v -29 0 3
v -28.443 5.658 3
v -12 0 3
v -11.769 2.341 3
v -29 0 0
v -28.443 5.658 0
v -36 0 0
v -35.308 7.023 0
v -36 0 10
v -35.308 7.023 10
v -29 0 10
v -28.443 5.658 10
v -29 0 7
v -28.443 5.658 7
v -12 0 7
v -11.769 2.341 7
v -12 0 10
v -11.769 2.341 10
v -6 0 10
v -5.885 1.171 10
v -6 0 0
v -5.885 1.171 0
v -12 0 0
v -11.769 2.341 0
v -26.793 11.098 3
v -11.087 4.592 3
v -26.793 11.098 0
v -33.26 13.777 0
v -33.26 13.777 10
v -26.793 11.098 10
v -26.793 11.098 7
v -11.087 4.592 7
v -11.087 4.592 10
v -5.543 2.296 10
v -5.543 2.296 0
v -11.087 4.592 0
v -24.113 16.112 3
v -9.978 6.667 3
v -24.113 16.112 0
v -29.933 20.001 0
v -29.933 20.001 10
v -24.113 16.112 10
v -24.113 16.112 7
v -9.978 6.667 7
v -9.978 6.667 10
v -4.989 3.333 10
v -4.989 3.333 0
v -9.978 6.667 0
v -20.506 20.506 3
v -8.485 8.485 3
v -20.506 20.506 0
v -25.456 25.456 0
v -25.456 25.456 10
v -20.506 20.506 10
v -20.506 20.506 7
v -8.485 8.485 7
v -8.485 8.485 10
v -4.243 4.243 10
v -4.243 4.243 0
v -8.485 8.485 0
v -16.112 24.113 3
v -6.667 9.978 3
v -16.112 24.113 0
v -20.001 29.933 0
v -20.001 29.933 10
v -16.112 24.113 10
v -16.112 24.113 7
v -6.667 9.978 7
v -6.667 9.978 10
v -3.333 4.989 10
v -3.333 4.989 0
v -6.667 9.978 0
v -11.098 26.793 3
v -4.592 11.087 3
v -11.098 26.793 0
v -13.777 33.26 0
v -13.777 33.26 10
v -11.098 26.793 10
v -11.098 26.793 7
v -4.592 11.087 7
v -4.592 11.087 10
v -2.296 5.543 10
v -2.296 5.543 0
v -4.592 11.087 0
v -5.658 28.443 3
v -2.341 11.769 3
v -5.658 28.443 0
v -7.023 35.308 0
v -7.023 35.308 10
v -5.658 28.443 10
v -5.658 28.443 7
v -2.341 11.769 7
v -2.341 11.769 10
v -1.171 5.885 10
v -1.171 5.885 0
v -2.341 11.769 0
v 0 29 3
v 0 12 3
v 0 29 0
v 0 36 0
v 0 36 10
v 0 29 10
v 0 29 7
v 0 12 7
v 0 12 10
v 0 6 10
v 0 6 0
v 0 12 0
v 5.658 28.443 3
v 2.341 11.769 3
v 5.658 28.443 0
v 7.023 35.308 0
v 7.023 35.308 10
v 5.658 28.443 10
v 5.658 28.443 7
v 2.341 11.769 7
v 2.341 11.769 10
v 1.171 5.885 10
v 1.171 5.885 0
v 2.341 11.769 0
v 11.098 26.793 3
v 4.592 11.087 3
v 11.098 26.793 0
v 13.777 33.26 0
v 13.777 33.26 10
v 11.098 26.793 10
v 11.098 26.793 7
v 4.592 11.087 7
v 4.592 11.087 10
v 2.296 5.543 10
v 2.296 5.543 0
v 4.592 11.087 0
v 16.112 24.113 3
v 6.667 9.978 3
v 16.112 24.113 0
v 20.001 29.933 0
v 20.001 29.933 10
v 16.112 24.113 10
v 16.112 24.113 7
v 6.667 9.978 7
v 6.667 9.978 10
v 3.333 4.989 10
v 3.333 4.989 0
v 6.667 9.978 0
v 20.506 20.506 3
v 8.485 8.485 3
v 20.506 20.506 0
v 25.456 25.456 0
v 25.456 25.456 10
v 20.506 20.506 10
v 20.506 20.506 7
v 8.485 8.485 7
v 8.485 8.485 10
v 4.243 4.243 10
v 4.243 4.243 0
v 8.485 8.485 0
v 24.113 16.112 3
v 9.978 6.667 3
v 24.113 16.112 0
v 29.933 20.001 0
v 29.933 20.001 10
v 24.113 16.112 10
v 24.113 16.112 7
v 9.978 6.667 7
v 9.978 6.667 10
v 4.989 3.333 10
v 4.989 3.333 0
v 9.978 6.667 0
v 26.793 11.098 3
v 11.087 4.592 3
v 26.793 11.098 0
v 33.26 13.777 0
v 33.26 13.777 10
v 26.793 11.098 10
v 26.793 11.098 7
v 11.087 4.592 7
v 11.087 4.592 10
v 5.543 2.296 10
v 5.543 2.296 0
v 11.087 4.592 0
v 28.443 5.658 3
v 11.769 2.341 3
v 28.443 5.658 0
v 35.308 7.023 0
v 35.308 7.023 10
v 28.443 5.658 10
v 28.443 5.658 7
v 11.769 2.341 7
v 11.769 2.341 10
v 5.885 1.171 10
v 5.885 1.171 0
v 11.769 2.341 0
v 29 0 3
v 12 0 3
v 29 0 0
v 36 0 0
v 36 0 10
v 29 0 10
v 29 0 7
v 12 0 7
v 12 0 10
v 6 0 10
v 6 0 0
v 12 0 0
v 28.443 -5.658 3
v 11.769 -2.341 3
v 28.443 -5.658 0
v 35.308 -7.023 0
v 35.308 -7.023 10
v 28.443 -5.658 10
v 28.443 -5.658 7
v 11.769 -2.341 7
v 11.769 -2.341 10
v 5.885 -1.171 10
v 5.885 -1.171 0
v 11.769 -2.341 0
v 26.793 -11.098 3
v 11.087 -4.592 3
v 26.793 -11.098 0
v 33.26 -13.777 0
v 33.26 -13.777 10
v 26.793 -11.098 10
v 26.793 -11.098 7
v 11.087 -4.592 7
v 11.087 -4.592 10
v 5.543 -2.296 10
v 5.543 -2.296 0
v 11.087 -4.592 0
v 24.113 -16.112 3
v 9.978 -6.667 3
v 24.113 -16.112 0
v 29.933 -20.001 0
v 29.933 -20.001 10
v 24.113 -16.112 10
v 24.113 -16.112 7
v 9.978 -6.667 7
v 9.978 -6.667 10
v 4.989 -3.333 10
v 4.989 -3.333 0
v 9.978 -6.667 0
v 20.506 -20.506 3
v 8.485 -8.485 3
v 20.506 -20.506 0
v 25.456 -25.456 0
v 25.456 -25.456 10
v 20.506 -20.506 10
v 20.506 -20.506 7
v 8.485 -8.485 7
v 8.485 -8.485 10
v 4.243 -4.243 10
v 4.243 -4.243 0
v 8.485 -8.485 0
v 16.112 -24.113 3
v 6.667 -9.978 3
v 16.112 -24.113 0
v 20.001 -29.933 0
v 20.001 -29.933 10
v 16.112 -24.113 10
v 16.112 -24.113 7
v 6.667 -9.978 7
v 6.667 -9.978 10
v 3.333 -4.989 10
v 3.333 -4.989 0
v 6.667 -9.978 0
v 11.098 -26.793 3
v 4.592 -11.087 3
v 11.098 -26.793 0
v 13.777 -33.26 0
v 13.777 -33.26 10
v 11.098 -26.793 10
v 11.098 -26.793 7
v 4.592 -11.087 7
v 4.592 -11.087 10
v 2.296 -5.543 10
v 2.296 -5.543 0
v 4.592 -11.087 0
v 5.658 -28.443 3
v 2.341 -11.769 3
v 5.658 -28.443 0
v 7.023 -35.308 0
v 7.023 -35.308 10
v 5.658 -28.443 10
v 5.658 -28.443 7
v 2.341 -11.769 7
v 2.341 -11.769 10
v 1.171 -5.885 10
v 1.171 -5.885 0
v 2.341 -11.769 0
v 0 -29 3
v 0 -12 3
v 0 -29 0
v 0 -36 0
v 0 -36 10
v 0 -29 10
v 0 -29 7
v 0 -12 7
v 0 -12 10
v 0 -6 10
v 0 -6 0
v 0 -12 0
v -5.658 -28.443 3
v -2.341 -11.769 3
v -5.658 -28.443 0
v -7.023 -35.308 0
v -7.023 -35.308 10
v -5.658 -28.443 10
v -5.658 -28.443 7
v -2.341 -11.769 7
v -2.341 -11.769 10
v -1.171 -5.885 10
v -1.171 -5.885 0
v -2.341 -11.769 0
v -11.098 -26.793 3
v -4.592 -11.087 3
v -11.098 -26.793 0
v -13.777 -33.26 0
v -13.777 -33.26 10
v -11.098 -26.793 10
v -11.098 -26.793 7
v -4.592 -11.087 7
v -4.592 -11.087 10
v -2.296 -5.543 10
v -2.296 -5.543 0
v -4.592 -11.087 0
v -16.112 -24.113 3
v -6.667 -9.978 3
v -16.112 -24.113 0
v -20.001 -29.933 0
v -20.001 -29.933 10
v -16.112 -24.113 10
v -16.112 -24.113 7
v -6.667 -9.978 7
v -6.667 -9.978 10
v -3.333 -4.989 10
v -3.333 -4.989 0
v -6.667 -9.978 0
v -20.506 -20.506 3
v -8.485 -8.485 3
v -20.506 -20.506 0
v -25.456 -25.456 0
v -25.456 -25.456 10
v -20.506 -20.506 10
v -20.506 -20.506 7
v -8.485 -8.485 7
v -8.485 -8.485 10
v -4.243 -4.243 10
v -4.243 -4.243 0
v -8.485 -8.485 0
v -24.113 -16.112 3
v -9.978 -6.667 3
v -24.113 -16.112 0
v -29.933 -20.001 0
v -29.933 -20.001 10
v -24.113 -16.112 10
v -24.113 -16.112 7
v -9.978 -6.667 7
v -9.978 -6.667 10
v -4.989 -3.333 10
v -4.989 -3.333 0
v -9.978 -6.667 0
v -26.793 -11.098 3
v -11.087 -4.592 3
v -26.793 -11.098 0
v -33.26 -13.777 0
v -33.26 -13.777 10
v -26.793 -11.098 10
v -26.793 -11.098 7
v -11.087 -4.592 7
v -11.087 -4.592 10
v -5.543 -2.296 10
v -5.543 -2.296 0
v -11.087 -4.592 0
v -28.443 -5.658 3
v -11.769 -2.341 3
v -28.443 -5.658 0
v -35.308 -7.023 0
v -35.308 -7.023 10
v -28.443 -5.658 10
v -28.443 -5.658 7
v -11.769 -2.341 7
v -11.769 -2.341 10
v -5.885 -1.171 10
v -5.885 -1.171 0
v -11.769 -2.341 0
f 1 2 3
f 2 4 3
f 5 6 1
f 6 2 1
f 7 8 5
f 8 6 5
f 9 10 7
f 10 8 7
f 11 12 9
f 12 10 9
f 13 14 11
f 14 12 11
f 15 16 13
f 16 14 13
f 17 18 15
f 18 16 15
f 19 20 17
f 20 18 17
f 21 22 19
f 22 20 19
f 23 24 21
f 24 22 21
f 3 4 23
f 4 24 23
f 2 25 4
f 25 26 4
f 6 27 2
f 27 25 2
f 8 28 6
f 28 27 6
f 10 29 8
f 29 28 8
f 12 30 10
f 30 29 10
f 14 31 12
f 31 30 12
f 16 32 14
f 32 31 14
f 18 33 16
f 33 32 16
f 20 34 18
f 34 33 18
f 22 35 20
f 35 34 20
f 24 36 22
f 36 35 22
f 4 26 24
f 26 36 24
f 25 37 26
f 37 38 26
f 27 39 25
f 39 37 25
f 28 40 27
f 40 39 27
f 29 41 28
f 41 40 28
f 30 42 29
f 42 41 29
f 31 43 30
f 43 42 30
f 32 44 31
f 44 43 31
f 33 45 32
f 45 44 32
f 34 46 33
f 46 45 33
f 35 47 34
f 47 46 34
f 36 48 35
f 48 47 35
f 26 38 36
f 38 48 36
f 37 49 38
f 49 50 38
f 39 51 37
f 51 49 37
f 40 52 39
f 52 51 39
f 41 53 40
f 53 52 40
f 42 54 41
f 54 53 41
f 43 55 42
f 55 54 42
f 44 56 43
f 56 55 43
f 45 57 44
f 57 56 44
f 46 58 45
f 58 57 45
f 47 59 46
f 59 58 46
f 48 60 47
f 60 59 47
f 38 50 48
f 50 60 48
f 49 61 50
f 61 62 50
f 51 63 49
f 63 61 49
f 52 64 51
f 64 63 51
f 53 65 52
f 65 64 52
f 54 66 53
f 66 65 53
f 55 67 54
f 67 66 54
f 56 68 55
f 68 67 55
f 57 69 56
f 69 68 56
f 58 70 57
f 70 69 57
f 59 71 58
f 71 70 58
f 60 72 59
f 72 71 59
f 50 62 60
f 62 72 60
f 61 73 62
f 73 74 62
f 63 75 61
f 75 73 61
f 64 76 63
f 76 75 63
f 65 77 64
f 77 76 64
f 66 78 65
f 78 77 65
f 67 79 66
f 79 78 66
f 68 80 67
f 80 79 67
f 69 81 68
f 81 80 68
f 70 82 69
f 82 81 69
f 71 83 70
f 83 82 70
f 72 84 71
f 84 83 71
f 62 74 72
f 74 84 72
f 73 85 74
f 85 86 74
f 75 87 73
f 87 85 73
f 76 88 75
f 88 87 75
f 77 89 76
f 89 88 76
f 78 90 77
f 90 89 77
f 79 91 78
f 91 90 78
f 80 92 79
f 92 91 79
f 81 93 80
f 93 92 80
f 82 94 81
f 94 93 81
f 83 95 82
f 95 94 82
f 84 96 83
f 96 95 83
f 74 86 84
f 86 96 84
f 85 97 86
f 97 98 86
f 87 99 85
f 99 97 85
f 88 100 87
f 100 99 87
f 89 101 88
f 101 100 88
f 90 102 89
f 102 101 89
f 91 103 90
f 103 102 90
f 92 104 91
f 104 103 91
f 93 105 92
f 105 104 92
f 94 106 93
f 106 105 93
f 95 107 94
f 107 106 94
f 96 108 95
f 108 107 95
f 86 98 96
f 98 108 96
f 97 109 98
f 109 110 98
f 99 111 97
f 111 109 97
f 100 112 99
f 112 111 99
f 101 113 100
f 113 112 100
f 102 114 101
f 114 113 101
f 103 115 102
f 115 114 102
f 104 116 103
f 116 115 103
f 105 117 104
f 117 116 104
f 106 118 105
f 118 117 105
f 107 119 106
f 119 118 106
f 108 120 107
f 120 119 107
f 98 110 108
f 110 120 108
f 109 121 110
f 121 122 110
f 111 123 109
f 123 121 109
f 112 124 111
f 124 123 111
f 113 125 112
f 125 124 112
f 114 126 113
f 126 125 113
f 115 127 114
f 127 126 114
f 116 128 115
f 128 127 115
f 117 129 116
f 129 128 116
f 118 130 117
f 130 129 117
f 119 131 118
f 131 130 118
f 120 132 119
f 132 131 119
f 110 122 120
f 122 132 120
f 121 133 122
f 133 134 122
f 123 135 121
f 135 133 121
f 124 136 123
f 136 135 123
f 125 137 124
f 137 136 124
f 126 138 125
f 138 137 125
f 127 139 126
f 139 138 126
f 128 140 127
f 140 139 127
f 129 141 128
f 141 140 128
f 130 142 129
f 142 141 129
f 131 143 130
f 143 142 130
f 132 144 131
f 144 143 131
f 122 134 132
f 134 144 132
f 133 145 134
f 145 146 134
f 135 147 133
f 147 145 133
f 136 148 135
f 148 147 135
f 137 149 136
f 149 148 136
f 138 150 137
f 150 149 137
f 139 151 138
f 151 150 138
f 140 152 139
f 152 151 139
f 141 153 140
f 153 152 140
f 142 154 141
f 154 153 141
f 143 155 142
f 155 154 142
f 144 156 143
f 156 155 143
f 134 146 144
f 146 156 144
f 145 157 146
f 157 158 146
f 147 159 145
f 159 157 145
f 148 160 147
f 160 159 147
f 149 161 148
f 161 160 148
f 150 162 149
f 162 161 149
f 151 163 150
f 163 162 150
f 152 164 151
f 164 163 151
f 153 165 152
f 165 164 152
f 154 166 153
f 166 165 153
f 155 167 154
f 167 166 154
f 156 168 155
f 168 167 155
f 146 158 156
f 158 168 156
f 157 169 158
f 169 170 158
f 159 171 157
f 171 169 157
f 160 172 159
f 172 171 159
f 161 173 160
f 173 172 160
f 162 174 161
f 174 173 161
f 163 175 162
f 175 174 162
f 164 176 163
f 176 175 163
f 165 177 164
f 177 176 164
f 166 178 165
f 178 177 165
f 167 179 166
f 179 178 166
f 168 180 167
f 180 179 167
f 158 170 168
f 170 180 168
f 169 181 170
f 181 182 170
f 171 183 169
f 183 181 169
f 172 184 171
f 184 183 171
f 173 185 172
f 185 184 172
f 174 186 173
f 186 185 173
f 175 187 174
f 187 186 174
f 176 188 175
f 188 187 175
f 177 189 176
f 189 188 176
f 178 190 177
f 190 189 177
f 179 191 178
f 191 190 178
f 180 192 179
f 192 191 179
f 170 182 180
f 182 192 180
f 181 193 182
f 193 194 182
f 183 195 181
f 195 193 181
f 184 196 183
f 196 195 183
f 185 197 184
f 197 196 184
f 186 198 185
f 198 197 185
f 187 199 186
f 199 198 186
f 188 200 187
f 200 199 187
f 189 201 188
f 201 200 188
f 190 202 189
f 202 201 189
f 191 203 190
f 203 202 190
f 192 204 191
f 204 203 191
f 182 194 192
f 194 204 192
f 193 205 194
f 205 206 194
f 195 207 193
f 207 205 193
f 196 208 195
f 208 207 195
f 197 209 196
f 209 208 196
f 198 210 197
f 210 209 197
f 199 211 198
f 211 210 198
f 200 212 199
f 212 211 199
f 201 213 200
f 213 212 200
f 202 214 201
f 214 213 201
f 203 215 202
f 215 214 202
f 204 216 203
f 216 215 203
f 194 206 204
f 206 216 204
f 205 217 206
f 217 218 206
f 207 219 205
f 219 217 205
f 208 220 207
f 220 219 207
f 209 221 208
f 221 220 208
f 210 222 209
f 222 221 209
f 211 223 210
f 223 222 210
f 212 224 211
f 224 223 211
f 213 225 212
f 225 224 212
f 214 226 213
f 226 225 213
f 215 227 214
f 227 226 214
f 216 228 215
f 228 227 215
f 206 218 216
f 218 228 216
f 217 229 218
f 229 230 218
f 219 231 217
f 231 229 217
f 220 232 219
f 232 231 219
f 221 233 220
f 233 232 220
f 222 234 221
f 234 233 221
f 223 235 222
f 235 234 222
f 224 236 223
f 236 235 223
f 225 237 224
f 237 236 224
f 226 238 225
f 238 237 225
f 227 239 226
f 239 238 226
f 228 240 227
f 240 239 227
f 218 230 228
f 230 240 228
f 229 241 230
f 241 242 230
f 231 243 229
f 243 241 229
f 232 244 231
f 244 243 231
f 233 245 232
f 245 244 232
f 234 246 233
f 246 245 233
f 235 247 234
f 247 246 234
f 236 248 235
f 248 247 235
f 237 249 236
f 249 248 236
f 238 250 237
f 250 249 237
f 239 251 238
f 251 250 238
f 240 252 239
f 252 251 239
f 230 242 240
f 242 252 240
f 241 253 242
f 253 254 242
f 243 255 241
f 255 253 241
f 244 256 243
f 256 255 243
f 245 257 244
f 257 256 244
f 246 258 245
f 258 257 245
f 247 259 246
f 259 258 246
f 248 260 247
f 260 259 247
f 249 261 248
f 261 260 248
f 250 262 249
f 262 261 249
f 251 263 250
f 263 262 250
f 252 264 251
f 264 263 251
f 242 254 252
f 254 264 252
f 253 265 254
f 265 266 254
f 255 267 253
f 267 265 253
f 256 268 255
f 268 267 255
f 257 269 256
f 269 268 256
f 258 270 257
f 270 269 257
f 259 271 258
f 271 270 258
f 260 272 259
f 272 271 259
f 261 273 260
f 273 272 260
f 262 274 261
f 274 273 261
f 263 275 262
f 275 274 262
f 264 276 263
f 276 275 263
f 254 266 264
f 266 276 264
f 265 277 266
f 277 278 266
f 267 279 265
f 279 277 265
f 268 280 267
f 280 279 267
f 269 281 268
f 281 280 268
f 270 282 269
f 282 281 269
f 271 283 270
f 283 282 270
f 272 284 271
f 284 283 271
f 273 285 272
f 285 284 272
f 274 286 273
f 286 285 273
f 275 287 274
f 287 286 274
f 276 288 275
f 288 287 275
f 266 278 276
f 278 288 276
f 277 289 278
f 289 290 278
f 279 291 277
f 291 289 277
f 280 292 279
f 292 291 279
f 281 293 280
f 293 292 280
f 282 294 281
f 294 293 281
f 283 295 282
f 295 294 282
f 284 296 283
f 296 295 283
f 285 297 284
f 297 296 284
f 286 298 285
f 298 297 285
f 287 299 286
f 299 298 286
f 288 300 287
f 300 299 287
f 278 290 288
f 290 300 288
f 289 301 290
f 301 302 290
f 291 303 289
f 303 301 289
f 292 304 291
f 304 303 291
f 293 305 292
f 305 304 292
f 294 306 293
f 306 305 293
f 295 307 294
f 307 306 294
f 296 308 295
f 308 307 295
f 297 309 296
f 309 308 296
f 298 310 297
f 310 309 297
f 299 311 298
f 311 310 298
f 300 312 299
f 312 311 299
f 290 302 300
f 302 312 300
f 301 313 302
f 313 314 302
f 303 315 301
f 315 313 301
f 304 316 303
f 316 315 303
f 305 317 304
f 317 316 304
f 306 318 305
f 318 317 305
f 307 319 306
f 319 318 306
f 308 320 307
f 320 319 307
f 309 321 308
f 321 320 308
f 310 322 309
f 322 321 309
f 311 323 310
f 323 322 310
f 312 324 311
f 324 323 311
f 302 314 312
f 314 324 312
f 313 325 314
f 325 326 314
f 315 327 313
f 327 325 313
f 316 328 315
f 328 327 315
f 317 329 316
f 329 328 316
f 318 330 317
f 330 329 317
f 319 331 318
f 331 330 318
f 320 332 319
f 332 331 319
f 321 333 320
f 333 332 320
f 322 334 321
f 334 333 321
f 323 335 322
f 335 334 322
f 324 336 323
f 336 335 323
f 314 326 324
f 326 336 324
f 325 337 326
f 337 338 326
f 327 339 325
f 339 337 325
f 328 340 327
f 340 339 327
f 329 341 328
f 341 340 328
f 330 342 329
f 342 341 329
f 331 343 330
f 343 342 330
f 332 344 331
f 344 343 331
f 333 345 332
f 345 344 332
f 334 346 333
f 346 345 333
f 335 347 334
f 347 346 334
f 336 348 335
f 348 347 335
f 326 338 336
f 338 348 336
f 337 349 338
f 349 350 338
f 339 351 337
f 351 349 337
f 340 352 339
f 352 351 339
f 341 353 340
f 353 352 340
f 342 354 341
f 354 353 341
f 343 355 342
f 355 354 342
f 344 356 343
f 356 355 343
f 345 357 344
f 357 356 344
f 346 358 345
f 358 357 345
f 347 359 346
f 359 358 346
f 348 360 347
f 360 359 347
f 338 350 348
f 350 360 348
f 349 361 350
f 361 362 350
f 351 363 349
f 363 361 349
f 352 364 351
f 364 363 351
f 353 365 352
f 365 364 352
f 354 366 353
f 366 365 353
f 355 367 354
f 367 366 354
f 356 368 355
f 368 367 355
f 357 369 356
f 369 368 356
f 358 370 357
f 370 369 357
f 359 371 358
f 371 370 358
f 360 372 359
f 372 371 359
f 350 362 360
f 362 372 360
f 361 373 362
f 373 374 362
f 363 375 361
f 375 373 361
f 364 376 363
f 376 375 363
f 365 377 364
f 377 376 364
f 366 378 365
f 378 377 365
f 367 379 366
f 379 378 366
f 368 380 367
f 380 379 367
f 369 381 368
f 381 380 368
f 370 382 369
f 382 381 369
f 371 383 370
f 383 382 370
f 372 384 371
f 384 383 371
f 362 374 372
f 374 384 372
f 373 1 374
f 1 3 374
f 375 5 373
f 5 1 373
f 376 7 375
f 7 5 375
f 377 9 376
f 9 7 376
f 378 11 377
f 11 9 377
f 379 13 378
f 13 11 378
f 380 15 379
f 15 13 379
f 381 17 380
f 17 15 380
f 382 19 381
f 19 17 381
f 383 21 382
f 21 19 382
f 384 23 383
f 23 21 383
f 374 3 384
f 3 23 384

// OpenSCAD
$fn = 32;

// ----------------------------------------------------------------------
// Revolved part: handwheel R36
// ----------------------------------------------------------------------

// --- parameters (mm) ---
bore_r = 6;               // bore radius
rim_r = 36;               // rim radius
rim_w = 7;                // rim axial width
rim_t = 10;               // rim diameter height
hub_r = 12;               // hub radius
web_t = 4;                // web thickness
revolve_angle = 360;      // revolve sweep, degrees

bore_d = 2 * bore_r;
rim_d = 2 * rim_r;
hub_d = 2 * hub_r;

profile = [[6, 0], [12, 0], [12, 3], [29, 3], [29, 0], [36, 0], [36, 10], [29, 10], [29, 7], [12, 7], [12, 10], [6, 10]];  // primary outline, 12 points, counter clockwise

// --- the one profile operation ---
rotate_extrude(angle = revolve_angle) polygon(points = profile);
